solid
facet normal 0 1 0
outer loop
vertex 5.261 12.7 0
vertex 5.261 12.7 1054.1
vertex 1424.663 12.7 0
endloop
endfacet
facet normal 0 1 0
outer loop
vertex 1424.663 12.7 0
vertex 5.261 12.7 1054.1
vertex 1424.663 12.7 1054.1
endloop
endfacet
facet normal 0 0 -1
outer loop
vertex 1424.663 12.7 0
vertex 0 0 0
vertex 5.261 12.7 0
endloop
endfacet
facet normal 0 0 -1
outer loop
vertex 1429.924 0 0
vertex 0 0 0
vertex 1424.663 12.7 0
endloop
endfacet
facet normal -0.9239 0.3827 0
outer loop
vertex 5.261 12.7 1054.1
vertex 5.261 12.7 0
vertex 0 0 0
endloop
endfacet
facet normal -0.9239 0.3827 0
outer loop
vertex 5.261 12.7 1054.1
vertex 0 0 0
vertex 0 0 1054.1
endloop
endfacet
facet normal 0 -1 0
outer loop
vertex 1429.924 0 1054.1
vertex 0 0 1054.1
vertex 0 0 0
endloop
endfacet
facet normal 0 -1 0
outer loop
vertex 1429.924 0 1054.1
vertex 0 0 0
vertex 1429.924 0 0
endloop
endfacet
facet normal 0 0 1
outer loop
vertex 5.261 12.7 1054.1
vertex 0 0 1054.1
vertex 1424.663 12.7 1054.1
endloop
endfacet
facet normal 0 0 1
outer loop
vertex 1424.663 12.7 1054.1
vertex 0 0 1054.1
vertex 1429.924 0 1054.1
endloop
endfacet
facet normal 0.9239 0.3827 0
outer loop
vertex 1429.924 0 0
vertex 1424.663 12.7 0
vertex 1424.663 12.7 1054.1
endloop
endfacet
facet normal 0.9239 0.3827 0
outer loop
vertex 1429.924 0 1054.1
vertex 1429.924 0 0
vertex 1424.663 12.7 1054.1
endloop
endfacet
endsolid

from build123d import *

# Parameters (mm, degrees)
F0_W       = 1429.9238244843
F0_H       = 1054.1
F1_DEPTH   = 12.7
F2_SIZE2   = 5.260502
F2_SIZE    = 12.69999
F2_2_SIZE2 = 5.260502
F2_2_SIZE  = 12.69999


# Not quite as in the source:
# - a fillet or chamfer is up to 0.001 mm smaller than in the source, because OpenCascade refuses the exact size


with BuildPart() as f1:
    # F0 (on Front) → F1 (new body)
    with BuildSketch(Plane.XZ):
        with Locations((714.9619122421, 527.05)):
            Rectangle(F0_W, F0_H)
    extrude(amount=-F1_DEPTH)

    # F2 (size 12.7 and 5.2605122421 in the source; OpenCascade refuses exactly that, so slightly less here)
    f2_edges = [f1.edges().sort_by_distance(p)[0] for p in [
        (1429.923824, 12.7, 527.05),
    ]]
    f2_side = f1.faces().sort_by_distance((1429.923824, 6.35, 527.05))[0]
    chamfer(f2_edges, length=F2_SIZE, length2=F2_SIZE2, reference=f2_side)

    # F2#2 (size 12.7 and 5.2605122421 in the source; OpenCascade refuses exactly that, so slightly less here)
    f2_2_edges = [f1.edges().sort_by_distance(p)[0] for p in [
        (0, 12.7, 527.05),
    ]]
    f2_2_side = f1.faces().sort_by_distance((0, 6.35, 527.05))[0]
    chamfer(f2_2_edges, length=F2_2_SIZE, length2=F2_2_SIZE2, reference=f2_2_side)


solid = f1.part
